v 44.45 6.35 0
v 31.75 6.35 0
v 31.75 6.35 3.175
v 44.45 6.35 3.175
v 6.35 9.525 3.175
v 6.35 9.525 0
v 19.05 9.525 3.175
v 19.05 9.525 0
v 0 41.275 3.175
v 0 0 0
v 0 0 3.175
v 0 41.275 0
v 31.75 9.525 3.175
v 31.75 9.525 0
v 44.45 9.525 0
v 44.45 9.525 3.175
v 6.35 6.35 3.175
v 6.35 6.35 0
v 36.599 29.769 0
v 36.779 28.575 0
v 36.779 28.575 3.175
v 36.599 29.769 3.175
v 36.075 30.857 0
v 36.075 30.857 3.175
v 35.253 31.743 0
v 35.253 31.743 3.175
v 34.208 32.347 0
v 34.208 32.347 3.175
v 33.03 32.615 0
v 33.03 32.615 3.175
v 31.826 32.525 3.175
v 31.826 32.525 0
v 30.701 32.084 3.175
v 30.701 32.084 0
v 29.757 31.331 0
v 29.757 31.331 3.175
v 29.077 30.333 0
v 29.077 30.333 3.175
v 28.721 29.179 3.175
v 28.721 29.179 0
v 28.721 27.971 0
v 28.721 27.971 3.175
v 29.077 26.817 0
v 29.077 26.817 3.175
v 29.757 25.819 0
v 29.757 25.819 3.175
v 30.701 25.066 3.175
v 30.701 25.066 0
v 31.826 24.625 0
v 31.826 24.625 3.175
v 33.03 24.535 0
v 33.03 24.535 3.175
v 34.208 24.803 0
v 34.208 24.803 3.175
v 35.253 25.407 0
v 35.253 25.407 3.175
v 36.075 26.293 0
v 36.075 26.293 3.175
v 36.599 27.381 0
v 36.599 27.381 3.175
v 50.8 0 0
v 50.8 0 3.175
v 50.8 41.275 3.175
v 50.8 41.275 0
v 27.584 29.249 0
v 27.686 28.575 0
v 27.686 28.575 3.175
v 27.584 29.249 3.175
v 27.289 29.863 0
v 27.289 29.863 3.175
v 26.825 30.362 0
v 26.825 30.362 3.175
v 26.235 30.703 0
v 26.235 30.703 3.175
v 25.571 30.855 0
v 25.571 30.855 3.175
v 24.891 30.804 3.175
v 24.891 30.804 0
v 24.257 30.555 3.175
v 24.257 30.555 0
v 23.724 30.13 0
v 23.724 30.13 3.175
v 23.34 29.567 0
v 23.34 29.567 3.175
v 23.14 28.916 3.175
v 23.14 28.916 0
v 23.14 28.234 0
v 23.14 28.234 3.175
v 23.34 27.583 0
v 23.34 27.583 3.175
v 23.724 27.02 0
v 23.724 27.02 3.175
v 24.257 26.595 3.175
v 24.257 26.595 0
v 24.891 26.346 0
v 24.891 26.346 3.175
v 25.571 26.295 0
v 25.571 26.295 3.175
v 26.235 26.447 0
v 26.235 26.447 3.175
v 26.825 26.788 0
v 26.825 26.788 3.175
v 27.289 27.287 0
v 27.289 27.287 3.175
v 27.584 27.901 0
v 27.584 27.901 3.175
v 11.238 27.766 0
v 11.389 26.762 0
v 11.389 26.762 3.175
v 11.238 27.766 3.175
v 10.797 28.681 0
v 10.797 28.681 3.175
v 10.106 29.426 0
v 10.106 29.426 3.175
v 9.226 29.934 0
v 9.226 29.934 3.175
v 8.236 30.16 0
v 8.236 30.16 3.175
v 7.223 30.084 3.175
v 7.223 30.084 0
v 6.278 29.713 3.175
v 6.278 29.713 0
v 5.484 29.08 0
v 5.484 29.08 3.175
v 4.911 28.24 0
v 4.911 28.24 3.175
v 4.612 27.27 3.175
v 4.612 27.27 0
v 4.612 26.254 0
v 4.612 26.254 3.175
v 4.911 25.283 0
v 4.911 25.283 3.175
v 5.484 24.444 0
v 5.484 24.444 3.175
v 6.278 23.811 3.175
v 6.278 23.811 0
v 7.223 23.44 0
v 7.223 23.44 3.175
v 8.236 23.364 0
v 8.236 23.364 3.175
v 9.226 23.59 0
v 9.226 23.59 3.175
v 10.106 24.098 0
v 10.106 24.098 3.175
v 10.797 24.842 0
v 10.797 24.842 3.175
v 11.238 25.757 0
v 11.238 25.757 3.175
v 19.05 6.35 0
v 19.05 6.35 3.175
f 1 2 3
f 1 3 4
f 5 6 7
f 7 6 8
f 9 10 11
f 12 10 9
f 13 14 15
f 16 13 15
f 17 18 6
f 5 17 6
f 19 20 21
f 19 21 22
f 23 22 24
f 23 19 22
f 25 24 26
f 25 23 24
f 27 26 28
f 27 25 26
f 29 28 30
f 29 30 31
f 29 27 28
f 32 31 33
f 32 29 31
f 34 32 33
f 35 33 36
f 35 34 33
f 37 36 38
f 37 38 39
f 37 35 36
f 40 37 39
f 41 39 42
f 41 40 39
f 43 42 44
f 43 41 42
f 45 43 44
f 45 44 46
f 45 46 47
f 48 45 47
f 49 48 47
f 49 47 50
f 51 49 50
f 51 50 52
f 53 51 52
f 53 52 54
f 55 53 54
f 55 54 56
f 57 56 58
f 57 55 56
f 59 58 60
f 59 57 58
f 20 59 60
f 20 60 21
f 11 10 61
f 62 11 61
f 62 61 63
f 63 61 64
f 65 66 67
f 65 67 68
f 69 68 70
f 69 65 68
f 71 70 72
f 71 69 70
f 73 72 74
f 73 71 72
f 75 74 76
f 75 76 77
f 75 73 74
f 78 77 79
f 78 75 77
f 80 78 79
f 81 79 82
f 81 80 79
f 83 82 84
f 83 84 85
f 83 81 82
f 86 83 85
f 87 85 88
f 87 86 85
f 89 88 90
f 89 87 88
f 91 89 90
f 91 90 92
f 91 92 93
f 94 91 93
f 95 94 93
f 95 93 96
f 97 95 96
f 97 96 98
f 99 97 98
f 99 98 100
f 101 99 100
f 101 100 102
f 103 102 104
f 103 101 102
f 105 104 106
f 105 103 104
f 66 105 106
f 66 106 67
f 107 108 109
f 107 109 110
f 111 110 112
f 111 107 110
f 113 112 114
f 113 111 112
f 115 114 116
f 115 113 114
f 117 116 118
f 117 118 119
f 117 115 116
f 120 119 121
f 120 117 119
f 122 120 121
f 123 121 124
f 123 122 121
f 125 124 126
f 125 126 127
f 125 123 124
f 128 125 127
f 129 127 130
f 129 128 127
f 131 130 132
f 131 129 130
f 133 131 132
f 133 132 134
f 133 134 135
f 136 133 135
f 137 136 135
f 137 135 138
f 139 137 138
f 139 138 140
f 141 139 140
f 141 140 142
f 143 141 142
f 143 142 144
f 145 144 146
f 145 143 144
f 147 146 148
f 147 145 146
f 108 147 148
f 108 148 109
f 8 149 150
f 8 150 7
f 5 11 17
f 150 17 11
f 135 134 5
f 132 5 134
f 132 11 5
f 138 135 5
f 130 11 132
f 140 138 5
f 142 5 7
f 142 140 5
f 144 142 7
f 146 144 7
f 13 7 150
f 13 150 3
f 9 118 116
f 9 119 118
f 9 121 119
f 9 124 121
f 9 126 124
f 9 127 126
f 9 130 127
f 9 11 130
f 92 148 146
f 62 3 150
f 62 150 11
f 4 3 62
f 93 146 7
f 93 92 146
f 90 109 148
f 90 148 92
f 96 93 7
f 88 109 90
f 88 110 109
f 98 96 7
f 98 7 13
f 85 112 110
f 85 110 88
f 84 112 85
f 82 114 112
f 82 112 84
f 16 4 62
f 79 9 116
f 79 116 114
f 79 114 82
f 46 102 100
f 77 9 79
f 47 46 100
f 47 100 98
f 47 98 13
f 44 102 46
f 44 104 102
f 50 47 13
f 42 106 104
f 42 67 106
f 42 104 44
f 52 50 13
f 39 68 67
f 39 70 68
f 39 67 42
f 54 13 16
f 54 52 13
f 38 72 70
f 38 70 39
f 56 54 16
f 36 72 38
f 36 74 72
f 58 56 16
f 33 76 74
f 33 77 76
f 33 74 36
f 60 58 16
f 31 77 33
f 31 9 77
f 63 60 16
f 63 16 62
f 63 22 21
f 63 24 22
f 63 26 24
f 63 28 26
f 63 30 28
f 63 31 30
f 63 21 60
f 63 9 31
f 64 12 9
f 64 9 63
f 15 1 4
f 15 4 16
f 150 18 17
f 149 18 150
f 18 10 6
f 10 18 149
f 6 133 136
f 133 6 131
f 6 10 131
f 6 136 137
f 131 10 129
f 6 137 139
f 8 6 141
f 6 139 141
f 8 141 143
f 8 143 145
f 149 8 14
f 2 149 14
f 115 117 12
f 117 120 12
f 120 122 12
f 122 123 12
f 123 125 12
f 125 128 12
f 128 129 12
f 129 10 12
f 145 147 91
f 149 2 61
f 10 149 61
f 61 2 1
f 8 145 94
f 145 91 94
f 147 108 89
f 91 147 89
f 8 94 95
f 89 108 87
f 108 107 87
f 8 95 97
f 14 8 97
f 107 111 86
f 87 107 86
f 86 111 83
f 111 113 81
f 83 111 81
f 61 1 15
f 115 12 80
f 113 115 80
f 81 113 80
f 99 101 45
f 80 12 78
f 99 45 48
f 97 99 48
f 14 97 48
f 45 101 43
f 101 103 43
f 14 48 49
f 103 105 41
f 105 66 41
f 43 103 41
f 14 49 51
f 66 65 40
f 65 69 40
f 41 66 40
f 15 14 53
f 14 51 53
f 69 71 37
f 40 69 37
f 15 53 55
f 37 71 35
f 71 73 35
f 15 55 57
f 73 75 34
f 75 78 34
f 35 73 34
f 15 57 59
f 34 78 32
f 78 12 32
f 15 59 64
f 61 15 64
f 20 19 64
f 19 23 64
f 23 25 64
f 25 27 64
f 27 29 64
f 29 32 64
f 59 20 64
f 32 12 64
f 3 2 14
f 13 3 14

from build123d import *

# Parameters (mm, degrees)
SKETCH1_W           = 50.8
SKETCH1_H           = 41.275
SKETCH1_R           = 2.286
SKETCH1_R_2         = 3.407671893
SKETCH1_R_3         = 4.051699908
SKETCH1_W_2         = 12.7
SKETCH1_H_2         = 3.175
BOSS_EXTRUDE1_DEPTH = 3.175


with BuildPart() as part:
    # Sketch1 → Boss-Extrude1 (new body)
    with BuildSketch(Plane.XY):
        with Locations((25.4, 20.6375)):
            Rectangle(SKETCH1_W, SKETCH1_H)
        with Locations((25.4, 28.575)):
            Circle(SKETCH1_R, mode=Mode.SUBTRACT)
        with Locations((7.98153171, 26.761776277)):
            Circle(SKETCH1_R_2, mode=Mode.SUBTRACT)
        with Locations((32.727276231, 28.575)):
            Circle(SKETCH1_R_3, mode=Mode.SUBTRACT)
        with Locations((12.7, 7.9375)):
            Rectangle(SKETCH1_W_2, SKETCH1_H_2, mode=Mode.SUBTRACT)
        with Locations((38.1, 7.9375)):
            Rectangle(SKETCH1_W_2, SKETCH1_H_2, mode=Mode.SUBTRACT)
    extrude(amount=BOSS_EXTRUDE1_DEPTH)


solid = part.part
